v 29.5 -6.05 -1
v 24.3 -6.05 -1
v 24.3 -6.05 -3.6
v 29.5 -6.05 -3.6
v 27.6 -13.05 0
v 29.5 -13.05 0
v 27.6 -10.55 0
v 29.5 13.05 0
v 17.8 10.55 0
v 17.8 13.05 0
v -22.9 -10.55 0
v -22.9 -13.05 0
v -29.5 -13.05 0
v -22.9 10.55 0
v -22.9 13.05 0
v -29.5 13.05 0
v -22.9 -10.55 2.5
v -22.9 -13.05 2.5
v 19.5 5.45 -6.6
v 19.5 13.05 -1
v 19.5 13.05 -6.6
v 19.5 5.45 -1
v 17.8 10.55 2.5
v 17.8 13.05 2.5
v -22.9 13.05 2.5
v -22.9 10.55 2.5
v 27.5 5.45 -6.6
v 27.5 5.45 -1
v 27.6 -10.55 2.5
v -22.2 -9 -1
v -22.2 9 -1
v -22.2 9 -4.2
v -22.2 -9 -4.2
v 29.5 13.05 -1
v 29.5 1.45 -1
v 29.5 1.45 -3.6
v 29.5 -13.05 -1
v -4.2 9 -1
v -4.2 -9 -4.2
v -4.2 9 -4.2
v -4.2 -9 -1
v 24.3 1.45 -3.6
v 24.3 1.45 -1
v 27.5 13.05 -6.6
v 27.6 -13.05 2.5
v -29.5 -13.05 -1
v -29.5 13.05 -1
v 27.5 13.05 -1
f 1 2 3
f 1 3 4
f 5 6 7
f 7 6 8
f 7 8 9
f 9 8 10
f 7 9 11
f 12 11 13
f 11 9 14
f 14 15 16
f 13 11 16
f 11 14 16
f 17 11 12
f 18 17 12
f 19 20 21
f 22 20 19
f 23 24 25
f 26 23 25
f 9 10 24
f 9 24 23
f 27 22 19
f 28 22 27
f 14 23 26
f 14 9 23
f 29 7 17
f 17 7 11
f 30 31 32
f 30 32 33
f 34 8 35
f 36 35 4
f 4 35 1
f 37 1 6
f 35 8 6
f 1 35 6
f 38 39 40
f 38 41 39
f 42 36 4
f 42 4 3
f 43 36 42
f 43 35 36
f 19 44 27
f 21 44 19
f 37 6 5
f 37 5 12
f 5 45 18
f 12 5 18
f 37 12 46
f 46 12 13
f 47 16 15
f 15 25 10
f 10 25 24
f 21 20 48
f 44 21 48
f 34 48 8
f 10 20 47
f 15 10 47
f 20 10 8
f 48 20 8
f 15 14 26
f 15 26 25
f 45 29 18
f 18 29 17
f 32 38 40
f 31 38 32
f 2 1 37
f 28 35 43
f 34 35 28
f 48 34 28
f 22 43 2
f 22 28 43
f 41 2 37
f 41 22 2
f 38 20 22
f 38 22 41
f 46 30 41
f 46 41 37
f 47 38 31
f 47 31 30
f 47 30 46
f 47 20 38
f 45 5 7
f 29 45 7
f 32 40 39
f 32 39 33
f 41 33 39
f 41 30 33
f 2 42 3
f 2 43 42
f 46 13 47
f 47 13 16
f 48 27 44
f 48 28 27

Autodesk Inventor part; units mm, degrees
ref_plane "YZ Plane" through (0, 0, 0) normal (1, 0, 0) x (0, 1, 0)
ref_plane "XZ Plane" through (0, 0, 0) normal (0, 1, 0) x (-1, 0, 0)
ref_plane "Arbeitsebene1" through (0, 0, 0) normal (0, 0, -1) x (-1, 0, 0)
sketch "Skizze5" plane through (0, 0, 0) normal (0, 0, -1) x (-1, 0, 0)
  line L0 (29.5, 13.05) -> (-29.5, 13.05)
  line L1 (-29.5, 13.05) -> (-29.5, -13.05)
  line L2 (-29.5, -13.05) -> (29.5, -13.05)
  line L3 (29.5, -13.05) -> (29.5, 13.05)
  point P0 (0, 0)
  point P1 (29.5, 0)
  point P2 (0, -13.05)
  dimension "d70" = 26.1
  dimension "d71" = 59
extrude "Extrusion5" add sketch "Skizze5" along normal blind 1
sketch "Skizze4" plane through (0, 0, 0) normal (0, 0, -1) x (-1, 0, 0)
  line L0 (22.9, 13.05) -> (-17.8, 13.05)
  line L1 (-17.8, 13.05) -> (-17.8, 10.55)
  line L2 (-17.8, 10.55) -> (22.9, 10.55)
  line L3 (22.9, 10.55) -> (22.9, 13.05)
  line L4 (29.5, -13.05) -> (29.5, 13.05) projected
  line L5 (-29.5, -13.05) -> (29.5, -13.05) projected
  line L6 (29.5, 13.05) -> (-29.5, 13.05) projected
  line L7 (22.9, -13.05) -> (-27.6, -13.05)
  line L8 (-27.6, -13.05) -> (-27.6, -10.55)
  line L9 (-27.6, -10.55) -> (22.9, -10.55)
  line L10 (22.9, -10.55) -> (22.9, -13.05)
  dimension "d68" = 40.7
  dimension "d69" = 2.5
  dimension "d77" = 6.6
  dimension "d78" = 50.5
extrude "Extrusion4" add sketch "Skizze4" against normal blind 2.5
sketch "Skizze6" plane through (0, 0, -1) normal (0, 0, -1) x (-1, 0, 0)
  line L0 (22.2, -9) -> (4.2, -9)
  line L1 (4.2, -9) -> (4.2, 9)
  line L2 (4.2, 9) -> (22.2, 9)
  line L3 (22.2, 9) -> (22.2, -9)
  line L4 (29.5, -13.05) -> (29.5, 13.05) projected
  point P0 (0, 0)
  point P1 (4.2, 0)
  dimension "d26" = 18
  dimension "d27" = 18
  dimension "d72" = 7.3
extrude "Extrusion6" add sketch "Skizze6" along normal blind 3.2
sketch "Skizze7" plane through (0, 0, -1) normal (0, 0, -1) x (-1, 0, 0)
  line L0 (-24.3, -6.05) -> (-29.5, -6.05)
  line L1 (-29.5, -6.05) -> (-29.5, 1.45)
  line L2 (-29.5, 1.45) -> (-24.3, 1.45)
  line L3 (-24.3, 1.45) -> (-24.3, -6.05)
  line L4 (-29.5, 13.05) -> (-29.5, -13.05) projected
  line L5 (-29.5, -13.05) -> (29.5, -13.05) projected
  point P0 (0, 0)
  dimension "d31" = 7.5
  dimension "d32" = 5.2
  dimension "d73" = 7
  dimension "d74" = 0
extrude "Extrusion7" add sketch "Skizze7" along normal blind 2.6
sketch "Skizze8" plane through (0, 0, -1) normal (0, 0, -1) x (-1, 0, 0)
  line L0 (-19.5, 5.45) -> (-27.5, 5.45)
  line L1 (-27.5, 5.45) -> (-27.5, 13.05)
  line L2 (-27.5, 13.05) -> (-19.5, 13.05)
  line L3 (-19.5, 13.05) -> (-19.5, 5.45)
  line L4 (29.5, 13.05) -> (-29.5, 13.05) projected
  line L5 (-29.5, 13.05) -> (-29.5, 1.45) projected
  point P0 (0, 0)
  dimension "d36" = 7.6
  dimension "d37" = 8
  dimension "d75" = 0
  dimension "d79" = 2
extrude "Extrusion8" add sketch "Skizze8" along normal blind 5.6
properties part number "Dummy_ESP32_LOLIN_D32"
